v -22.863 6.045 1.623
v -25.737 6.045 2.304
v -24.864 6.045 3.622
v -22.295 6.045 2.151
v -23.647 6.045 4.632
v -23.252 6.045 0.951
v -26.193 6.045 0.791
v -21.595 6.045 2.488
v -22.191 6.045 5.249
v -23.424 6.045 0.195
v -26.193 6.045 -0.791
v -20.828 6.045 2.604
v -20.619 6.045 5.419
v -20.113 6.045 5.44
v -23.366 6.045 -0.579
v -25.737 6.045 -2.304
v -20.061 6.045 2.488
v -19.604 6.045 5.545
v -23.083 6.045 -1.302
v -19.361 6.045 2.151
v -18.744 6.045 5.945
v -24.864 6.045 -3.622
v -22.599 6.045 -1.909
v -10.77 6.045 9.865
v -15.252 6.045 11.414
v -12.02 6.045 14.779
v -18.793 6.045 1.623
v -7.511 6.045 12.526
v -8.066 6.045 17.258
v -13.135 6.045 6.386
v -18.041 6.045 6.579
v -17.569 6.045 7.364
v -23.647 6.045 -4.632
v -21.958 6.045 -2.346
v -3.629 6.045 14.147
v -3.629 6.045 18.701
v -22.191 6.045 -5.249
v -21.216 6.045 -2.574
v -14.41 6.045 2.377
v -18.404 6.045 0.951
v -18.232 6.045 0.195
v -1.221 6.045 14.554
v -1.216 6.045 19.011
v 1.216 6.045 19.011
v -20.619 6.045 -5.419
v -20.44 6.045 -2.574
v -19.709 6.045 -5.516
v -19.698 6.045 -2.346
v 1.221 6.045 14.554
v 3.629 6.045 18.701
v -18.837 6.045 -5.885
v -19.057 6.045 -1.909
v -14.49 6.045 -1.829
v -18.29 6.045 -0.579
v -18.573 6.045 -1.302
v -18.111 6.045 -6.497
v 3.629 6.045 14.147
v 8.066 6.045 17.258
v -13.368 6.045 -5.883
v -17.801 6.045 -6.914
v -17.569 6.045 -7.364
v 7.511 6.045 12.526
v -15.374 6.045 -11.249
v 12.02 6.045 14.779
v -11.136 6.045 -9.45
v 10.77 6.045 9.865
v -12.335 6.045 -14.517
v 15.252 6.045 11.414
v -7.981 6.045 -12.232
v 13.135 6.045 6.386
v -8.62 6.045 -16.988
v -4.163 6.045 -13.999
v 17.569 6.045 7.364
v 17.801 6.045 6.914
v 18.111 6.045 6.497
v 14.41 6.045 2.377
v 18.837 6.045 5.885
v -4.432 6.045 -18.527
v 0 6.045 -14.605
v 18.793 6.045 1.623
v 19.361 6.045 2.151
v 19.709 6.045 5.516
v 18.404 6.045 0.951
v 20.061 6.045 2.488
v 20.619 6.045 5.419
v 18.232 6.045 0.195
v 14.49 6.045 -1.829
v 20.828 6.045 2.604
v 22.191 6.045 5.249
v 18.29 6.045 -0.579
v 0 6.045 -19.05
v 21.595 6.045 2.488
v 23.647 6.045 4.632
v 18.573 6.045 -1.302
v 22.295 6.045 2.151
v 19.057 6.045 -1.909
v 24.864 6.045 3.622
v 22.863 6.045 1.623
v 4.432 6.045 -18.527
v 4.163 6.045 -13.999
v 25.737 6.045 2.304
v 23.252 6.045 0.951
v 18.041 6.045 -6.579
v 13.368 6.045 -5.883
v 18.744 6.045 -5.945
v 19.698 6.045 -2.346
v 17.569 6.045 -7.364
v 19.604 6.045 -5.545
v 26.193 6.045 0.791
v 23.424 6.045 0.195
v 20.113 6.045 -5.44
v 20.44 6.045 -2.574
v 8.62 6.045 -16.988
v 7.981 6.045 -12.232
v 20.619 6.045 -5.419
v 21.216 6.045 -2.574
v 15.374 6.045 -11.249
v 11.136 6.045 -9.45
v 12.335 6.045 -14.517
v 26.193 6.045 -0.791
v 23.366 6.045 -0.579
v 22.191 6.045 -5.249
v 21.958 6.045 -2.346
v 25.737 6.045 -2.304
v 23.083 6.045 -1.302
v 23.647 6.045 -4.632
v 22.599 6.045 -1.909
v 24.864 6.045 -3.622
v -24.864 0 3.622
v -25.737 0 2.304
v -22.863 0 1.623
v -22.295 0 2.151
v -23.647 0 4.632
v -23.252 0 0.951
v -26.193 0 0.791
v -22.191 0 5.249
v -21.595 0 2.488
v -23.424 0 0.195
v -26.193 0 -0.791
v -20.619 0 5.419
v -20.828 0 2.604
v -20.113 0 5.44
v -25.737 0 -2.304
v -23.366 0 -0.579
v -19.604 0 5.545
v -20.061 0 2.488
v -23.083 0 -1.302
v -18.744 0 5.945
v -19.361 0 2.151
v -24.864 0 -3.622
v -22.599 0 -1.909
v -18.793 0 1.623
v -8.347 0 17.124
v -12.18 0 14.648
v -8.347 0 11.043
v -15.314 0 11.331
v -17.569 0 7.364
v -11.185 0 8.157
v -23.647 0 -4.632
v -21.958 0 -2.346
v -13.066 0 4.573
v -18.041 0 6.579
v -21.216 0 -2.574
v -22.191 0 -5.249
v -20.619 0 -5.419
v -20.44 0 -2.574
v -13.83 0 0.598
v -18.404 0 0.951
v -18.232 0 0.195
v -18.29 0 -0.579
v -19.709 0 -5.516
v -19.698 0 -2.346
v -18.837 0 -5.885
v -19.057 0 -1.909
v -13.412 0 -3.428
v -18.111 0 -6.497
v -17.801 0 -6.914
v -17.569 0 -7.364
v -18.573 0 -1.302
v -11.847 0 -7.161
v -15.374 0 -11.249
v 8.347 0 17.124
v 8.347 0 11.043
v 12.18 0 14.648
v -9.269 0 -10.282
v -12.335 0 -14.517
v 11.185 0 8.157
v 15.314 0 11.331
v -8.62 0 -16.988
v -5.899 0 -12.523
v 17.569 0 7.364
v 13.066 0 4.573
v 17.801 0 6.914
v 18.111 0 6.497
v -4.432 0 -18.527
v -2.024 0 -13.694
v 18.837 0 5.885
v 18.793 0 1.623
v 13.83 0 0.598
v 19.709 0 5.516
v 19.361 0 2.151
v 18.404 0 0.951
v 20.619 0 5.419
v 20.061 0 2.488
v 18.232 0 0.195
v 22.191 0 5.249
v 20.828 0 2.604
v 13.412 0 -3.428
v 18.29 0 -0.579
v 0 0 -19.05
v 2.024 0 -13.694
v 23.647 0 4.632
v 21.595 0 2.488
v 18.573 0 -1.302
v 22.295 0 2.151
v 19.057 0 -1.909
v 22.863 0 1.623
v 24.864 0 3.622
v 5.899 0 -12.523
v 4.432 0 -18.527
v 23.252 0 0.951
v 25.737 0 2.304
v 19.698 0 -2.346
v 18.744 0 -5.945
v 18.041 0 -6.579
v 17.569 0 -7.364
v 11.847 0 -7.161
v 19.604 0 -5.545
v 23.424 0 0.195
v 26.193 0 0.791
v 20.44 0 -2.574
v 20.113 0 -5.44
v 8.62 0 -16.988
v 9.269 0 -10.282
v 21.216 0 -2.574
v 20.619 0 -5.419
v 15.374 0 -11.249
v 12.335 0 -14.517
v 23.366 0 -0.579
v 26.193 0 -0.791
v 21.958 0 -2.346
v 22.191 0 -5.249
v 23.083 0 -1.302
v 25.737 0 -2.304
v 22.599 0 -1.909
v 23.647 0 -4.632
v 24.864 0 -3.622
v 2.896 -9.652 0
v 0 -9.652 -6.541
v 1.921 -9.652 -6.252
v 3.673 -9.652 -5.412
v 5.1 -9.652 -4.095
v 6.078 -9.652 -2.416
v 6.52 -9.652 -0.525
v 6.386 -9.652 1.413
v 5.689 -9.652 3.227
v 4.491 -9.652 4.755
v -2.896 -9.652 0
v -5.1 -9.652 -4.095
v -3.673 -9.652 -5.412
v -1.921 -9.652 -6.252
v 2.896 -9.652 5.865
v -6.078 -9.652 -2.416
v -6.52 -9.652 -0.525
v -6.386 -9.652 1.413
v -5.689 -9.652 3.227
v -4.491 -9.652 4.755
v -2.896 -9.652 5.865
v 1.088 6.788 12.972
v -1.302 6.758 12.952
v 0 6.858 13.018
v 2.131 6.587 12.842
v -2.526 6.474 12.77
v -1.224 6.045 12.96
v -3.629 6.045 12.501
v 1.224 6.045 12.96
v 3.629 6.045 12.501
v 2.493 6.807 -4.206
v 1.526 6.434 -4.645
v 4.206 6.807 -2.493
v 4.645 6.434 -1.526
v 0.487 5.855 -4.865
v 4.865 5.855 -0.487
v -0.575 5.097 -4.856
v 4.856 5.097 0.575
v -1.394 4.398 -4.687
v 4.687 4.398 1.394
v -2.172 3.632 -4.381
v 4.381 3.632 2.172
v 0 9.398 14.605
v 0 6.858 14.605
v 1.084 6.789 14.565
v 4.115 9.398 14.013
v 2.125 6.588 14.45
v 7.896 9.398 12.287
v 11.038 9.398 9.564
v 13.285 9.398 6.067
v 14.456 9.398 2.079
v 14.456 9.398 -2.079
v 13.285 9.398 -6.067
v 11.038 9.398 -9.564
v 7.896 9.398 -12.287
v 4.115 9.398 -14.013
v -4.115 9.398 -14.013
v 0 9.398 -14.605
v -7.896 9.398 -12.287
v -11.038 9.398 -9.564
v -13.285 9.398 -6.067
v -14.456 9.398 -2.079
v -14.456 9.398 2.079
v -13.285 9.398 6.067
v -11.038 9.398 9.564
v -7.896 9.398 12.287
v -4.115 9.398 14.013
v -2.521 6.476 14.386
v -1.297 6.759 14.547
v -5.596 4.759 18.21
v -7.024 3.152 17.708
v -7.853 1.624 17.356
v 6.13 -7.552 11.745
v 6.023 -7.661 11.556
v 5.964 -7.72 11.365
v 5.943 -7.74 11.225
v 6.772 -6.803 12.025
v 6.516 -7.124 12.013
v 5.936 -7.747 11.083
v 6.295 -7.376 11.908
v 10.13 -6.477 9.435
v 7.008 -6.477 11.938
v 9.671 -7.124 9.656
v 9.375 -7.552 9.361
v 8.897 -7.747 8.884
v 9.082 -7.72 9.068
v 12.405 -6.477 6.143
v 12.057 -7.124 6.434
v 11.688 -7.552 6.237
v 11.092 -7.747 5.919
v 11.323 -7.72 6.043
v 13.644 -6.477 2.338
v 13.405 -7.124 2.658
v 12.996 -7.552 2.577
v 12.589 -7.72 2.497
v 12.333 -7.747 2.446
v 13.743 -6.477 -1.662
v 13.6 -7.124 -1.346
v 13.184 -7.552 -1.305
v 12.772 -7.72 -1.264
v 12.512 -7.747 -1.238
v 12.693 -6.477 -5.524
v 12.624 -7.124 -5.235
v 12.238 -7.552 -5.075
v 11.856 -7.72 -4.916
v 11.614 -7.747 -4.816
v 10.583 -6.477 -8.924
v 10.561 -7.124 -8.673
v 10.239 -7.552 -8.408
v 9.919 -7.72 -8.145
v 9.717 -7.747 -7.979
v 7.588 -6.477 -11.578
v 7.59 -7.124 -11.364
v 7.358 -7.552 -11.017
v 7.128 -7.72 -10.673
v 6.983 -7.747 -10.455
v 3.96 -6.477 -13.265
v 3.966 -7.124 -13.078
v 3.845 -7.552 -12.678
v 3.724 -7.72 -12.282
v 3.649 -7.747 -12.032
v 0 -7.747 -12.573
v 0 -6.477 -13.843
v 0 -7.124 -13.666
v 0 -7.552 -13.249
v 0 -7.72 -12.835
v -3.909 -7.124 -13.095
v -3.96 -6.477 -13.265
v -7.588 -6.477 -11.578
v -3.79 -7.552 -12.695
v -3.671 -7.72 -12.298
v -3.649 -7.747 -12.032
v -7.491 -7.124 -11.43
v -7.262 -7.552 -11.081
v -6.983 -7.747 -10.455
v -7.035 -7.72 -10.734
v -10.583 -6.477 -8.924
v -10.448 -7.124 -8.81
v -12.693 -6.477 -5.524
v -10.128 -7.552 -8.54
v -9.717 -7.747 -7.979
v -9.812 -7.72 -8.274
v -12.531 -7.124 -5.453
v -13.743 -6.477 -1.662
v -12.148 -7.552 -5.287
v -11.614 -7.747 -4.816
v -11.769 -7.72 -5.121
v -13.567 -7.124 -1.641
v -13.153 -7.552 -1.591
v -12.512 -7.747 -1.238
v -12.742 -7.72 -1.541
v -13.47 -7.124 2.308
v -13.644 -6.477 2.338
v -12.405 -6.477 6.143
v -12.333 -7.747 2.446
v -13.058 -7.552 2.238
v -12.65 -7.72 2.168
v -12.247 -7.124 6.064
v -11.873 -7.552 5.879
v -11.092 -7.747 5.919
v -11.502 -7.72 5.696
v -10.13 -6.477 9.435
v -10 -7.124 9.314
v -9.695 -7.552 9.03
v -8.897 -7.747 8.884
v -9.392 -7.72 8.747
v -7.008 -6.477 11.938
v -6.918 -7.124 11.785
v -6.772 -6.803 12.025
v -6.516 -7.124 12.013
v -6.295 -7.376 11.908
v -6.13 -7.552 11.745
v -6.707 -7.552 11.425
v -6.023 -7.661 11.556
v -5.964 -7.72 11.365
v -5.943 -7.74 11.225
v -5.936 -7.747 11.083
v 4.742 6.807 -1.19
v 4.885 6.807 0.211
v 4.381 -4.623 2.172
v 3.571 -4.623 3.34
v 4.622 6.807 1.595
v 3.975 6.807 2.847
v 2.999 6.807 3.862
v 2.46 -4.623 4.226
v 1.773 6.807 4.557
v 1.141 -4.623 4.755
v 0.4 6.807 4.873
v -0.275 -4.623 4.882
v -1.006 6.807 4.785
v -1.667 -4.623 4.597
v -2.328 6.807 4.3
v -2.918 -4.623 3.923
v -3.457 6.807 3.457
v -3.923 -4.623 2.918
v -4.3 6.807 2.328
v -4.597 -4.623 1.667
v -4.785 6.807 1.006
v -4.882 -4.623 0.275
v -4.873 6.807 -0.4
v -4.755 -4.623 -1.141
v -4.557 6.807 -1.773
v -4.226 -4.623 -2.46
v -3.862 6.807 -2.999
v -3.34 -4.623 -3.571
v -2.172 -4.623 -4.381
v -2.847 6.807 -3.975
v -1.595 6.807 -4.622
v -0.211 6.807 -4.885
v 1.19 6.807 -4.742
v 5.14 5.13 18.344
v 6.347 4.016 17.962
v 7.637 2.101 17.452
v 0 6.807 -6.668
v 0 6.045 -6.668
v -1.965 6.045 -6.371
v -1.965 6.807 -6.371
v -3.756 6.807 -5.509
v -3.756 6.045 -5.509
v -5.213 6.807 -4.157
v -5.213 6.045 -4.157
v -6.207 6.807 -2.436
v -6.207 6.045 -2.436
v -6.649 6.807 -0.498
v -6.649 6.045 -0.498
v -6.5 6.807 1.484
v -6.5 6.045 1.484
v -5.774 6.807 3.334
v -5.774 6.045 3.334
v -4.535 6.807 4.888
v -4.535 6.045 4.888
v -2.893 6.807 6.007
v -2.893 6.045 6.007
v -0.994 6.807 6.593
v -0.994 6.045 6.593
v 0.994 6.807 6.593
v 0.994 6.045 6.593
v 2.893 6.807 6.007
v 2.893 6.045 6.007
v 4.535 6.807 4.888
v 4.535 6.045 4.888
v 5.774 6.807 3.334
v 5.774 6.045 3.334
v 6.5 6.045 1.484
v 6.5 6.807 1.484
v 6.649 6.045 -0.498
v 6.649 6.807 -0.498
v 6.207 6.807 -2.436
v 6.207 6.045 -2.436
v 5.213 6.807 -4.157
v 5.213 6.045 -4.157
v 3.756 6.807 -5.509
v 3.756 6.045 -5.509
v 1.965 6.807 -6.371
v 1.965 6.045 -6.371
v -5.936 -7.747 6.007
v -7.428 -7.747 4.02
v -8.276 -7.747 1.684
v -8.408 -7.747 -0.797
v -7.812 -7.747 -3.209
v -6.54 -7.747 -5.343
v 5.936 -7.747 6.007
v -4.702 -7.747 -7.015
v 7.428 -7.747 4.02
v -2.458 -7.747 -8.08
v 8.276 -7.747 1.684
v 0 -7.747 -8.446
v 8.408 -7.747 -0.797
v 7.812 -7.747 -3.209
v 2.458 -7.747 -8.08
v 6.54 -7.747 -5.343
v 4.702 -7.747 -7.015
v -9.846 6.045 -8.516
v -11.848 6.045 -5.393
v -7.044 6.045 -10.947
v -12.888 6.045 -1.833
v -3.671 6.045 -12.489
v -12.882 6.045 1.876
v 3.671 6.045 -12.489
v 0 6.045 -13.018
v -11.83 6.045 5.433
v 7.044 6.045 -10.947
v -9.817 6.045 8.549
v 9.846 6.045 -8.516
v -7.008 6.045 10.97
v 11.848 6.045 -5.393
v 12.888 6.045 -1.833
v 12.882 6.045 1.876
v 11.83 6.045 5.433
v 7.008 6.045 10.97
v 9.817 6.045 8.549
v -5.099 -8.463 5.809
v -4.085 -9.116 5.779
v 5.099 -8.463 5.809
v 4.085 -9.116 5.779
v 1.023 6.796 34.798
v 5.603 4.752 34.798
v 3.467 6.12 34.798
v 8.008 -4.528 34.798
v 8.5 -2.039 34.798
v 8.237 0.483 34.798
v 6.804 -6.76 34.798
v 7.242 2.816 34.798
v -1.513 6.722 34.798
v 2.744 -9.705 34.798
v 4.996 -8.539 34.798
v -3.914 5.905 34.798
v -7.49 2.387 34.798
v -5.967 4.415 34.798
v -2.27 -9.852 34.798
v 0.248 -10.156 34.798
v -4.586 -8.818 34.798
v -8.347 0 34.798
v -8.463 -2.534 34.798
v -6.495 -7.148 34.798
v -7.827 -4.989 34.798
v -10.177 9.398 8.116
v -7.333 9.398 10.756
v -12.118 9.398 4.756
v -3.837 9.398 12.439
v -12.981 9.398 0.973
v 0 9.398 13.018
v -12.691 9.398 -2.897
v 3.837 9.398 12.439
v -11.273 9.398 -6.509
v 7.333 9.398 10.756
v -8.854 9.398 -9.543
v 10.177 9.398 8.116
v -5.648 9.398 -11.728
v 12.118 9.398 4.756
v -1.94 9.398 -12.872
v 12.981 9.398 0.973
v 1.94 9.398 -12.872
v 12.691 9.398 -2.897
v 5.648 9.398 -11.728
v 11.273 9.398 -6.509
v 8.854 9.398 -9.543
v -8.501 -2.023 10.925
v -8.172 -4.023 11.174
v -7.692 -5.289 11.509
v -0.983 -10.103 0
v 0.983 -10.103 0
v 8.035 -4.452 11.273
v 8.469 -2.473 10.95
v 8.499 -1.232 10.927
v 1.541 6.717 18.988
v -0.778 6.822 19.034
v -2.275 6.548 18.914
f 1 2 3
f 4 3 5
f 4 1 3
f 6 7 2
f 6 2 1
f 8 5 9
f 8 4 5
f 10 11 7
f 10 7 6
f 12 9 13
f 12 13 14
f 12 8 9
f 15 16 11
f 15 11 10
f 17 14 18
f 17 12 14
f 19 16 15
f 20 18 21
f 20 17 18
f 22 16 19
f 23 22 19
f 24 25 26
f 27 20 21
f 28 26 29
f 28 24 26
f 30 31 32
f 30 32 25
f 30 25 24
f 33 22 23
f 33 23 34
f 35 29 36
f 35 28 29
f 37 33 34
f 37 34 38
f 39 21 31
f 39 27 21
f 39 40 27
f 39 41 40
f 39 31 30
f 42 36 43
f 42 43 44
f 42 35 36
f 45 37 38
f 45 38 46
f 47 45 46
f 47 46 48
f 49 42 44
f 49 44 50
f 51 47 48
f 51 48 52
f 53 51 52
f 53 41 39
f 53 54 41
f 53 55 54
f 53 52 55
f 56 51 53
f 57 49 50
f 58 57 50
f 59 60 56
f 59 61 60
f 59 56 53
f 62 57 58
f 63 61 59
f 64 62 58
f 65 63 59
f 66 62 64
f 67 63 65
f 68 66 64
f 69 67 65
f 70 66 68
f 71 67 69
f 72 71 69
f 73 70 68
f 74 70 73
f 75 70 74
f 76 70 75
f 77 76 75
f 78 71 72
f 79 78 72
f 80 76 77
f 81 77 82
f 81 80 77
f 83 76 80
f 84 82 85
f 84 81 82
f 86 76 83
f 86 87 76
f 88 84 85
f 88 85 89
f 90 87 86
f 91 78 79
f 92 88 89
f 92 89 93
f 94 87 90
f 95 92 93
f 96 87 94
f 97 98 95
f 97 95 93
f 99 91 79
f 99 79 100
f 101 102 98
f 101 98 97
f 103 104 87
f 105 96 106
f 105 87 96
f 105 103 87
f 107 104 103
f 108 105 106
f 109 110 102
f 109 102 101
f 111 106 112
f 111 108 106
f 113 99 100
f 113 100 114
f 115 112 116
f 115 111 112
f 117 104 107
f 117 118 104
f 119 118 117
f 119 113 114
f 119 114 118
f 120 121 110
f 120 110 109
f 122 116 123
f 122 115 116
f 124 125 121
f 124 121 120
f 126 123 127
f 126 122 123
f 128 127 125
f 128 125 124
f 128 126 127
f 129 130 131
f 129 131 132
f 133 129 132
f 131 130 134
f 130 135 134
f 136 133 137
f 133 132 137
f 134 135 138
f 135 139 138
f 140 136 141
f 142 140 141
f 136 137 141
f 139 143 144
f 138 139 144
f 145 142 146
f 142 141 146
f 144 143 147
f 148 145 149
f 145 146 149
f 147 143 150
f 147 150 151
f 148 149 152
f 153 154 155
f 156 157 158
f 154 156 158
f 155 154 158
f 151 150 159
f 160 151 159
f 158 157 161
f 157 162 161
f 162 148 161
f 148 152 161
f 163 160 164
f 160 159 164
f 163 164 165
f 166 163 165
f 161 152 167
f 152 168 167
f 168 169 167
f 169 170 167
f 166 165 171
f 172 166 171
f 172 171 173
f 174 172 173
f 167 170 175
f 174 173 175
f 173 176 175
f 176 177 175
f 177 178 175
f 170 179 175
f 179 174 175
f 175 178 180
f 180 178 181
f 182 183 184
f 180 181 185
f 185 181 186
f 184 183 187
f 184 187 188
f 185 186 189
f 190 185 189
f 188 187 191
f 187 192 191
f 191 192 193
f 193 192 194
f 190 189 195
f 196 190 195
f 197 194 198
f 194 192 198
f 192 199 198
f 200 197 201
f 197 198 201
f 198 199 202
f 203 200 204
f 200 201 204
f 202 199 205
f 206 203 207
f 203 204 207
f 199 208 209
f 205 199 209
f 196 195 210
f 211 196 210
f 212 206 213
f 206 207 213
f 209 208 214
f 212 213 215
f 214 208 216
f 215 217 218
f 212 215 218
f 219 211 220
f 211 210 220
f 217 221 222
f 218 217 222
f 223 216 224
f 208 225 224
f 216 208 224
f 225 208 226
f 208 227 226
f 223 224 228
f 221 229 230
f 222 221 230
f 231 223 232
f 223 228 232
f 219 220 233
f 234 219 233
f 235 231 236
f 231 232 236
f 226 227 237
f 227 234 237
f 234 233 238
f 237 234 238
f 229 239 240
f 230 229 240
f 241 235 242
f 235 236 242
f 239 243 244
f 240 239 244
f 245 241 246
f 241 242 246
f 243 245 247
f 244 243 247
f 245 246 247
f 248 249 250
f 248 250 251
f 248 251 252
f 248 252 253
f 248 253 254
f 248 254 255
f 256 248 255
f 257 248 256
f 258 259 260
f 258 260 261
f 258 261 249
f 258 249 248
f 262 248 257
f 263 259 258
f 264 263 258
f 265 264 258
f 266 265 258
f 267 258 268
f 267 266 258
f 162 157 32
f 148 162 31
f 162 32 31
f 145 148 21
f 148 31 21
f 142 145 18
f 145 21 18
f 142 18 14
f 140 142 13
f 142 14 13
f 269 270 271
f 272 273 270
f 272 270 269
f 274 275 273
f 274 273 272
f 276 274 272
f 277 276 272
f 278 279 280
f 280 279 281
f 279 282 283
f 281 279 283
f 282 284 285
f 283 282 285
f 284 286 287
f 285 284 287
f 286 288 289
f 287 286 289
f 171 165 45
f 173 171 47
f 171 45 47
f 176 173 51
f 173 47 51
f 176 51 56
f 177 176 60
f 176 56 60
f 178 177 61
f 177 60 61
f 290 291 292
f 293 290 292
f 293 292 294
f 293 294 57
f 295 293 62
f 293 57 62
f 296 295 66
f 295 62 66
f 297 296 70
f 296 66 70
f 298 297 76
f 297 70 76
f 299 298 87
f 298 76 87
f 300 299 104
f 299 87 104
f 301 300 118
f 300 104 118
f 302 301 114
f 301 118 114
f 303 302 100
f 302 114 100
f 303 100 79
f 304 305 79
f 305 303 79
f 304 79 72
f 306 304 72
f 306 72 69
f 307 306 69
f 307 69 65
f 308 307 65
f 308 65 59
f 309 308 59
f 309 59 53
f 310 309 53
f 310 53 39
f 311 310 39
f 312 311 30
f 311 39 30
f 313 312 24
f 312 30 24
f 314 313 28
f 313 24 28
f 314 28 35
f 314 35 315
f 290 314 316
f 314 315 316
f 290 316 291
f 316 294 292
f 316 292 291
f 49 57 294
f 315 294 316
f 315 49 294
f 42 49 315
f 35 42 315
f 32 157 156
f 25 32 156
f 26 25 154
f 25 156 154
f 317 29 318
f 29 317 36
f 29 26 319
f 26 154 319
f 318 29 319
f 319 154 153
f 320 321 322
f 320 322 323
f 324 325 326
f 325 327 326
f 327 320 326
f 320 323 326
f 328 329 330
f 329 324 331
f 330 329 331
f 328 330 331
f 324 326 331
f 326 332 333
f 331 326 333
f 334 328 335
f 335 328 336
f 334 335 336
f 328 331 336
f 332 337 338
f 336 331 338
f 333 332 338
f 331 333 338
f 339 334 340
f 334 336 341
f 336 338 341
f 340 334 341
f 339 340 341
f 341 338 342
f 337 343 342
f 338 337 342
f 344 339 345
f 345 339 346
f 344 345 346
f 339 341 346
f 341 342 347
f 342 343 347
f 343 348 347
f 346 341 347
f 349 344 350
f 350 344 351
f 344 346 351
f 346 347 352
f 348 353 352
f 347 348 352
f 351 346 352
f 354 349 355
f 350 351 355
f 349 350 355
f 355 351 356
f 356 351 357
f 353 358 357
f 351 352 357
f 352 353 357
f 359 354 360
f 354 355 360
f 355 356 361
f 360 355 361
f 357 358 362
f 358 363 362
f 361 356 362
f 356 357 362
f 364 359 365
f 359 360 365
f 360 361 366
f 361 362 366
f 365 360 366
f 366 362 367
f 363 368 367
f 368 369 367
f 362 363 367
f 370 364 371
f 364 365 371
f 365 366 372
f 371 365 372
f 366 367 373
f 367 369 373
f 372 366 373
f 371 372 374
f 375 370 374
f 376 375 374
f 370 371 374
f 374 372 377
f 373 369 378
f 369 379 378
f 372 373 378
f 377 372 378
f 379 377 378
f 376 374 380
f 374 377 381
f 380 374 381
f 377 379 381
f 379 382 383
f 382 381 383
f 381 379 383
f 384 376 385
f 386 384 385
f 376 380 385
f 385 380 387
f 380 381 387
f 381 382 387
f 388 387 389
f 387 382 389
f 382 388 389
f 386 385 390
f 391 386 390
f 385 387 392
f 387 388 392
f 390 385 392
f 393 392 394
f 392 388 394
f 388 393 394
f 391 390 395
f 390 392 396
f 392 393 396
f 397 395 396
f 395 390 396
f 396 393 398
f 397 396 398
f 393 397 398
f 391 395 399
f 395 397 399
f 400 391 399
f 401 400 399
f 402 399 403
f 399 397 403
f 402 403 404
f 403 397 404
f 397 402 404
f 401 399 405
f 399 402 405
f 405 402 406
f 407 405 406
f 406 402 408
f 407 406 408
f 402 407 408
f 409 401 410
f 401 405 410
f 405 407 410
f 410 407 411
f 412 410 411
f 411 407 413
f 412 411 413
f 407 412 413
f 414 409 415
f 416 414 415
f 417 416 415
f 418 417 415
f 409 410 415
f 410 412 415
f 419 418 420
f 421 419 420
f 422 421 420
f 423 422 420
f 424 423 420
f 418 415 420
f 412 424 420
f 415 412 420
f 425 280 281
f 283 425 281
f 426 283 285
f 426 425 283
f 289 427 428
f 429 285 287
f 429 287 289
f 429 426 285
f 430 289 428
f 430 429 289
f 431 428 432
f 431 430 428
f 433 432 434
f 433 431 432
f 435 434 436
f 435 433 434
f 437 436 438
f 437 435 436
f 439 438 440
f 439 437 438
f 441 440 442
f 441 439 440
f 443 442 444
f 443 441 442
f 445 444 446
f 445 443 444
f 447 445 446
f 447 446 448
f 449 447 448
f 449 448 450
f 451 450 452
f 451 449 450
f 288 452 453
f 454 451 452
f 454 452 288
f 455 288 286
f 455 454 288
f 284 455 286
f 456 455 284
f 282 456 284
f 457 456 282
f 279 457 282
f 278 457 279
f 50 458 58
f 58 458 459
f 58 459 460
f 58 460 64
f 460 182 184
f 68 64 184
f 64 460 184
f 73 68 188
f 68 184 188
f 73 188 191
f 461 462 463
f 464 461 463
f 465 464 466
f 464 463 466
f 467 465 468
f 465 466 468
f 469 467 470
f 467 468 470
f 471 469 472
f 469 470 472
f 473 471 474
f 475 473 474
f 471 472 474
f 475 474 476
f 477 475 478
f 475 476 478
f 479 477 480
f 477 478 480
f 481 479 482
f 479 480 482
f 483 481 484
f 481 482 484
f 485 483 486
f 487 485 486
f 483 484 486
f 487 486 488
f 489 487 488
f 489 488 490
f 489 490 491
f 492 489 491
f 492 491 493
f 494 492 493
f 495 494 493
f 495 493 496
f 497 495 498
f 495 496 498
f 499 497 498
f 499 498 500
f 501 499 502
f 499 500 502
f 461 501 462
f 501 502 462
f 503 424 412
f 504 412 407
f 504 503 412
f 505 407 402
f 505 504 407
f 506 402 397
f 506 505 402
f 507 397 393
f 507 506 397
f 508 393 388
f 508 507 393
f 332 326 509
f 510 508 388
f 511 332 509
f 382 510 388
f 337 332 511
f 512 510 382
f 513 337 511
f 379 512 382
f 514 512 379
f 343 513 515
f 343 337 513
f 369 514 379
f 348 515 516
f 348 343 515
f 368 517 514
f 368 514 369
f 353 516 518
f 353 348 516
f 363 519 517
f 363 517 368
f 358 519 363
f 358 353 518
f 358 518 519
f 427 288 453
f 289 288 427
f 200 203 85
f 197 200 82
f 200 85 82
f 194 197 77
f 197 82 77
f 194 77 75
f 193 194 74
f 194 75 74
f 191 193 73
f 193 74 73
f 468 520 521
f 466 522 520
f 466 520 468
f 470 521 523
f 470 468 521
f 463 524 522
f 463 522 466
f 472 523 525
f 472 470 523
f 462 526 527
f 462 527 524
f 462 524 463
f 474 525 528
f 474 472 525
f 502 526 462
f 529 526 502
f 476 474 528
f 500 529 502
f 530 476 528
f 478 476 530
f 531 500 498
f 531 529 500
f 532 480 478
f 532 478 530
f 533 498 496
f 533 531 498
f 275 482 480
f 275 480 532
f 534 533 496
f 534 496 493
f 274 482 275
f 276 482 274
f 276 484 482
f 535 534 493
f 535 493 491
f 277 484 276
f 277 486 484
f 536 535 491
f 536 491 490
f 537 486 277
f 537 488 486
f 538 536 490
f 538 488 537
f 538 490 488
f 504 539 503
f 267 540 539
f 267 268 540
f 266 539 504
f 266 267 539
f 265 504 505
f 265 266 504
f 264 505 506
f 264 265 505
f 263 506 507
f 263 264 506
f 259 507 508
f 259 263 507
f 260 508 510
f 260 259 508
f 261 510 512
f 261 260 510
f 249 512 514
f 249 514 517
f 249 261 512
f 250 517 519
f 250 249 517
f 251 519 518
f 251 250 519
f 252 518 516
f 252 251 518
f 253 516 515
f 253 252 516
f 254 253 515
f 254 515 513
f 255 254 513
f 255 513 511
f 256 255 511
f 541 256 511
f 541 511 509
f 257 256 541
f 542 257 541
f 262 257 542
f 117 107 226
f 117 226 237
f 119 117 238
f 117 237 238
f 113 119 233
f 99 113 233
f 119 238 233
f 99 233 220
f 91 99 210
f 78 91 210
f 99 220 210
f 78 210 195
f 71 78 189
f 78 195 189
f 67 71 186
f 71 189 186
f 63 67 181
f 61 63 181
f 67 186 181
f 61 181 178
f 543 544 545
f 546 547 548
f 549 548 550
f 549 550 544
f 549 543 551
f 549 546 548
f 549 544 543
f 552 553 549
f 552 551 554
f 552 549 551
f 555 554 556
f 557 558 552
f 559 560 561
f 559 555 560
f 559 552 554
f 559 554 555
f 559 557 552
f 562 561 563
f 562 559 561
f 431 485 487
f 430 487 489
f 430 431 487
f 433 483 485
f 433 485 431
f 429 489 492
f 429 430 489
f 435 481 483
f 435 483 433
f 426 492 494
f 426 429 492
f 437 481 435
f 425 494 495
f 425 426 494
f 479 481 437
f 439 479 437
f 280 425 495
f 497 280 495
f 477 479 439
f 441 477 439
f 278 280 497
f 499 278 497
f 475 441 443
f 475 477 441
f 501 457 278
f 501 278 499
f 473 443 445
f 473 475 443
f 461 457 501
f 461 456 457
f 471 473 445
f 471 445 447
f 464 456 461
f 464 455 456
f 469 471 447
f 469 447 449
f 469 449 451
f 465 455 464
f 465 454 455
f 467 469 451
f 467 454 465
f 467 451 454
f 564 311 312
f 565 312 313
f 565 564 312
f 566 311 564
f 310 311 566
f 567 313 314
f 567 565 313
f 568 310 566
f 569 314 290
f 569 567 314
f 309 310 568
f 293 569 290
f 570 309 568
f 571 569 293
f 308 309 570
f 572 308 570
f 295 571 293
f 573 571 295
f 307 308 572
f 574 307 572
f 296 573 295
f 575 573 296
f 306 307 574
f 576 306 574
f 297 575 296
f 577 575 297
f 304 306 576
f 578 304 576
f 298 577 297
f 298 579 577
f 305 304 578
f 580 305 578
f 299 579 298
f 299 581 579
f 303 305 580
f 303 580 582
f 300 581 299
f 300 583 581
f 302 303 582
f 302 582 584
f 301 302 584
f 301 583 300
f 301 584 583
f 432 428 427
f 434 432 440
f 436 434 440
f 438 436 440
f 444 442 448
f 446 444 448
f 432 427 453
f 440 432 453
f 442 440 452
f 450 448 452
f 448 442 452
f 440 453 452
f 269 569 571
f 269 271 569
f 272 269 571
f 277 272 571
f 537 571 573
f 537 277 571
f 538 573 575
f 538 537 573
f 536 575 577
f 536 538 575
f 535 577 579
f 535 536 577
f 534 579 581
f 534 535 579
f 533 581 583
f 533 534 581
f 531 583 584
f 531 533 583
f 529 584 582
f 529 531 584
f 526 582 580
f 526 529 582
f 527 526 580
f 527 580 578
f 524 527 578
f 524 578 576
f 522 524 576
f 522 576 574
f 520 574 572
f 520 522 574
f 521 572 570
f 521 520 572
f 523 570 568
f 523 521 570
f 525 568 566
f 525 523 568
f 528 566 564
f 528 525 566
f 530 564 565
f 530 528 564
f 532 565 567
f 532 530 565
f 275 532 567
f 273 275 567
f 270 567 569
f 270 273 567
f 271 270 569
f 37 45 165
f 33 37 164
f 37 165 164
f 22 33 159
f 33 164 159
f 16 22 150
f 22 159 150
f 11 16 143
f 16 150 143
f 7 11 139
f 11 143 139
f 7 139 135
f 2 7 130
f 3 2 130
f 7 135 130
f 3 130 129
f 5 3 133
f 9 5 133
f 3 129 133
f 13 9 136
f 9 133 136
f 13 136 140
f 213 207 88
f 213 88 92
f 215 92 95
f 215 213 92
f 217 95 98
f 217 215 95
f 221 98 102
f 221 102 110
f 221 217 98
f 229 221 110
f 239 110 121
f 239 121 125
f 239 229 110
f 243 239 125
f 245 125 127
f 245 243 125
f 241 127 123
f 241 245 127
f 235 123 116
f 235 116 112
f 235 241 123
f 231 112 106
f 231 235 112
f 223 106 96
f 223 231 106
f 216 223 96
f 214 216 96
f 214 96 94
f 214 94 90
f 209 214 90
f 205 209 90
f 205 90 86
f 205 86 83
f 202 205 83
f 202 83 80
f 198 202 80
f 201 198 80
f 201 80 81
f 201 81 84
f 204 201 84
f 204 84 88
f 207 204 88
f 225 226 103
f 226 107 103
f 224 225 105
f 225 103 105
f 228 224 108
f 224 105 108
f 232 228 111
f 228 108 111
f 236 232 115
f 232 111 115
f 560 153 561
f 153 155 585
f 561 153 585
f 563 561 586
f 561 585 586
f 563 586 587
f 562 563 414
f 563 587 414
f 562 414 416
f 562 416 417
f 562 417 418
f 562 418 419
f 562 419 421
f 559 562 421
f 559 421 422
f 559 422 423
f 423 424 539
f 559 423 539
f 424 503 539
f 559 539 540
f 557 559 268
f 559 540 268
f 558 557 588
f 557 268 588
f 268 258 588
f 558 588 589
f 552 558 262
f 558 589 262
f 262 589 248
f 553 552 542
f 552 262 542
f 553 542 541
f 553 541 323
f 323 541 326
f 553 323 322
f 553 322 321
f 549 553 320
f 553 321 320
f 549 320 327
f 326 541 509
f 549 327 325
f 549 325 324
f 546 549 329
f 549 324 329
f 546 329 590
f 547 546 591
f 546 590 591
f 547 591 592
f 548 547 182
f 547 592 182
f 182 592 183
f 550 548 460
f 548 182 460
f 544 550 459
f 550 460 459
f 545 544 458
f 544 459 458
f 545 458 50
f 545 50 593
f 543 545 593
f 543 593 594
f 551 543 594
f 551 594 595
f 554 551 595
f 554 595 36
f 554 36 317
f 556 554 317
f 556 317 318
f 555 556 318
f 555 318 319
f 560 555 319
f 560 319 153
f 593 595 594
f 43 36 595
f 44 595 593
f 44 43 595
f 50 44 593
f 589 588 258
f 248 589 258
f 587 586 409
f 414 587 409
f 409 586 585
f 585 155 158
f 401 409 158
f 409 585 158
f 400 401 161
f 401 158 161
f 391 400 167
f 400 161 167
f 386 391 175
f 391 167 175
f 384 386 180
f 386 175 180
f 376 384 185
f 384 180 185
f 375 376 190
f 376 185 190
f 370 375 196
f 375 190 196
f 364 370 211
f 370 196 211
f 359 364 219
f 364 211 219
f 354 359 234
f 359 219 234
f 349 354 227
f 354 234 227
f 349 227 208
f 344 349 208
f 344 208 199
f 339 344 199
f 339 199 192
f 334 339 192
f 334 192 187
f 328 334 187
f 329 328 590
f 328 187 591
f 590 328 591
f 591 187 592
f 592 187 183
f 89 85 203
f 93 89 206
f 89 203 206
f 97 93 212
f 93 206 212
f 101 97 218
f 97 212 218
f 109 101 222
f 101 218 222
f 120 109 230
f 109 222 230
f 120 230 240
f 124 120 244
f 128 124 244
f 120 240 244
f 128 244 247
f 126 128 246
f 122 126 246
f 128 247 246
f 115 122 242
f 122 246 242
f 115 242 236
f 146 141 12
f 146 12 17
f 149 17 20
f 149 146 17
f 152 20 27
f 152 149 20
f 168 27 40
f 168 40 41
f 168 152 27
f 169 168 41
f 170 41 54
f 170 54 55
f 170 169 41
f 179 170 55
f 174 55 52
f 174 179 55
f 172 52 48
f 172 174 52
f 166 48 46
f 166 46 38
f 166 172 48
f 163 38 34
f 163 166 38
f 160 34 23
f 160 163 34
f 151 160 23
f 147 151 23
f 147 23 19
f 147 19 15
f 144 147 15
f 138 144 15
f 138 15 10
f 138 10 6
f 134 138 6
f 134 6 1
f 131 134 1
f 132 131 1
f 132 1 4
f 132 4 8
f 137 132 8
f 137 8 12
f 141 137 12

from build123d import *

# Parameters (mm, degrees)
SKETCH3_R           = 2.6035
BOSS_EXTRUDE1_DEPTH = 9.398
CUT_EXTRUDE1_START  = -3.3528
SKETCH4_R           = 14.605
SKETCH4_R_2         = 2.6035
SKETCH4_R_3         = 13.0175
CUT_EXTRUDE1_DEPTH  = 3.3528
SKETCH5_R           = 13.843
BOSS_EXTRUDE2_DEPTH = 7.747
SKETCH6_R           = 8.4455
BOSS_EXTRUDE3_DEPTH = 1.905
SKETCH7_R           = 8.509
BOSS_EXTRUDE4_DEPTH = 34.798
CUT_EXTRUDE2_DEPTH  = 47.503968347
FILLET1_R           = 3.175
CHAMFER1_SIZE       = 1.905
SKETCH9_R           = 6.6675
BOSS_EXTRUDE5_DEPTH = 0.762
CUT_EXTRUDE3_DEPTH  = 11.43
CHAMFER2_SIZE       = 3.175
FILLET2_R           = 1.27


with BuildPart() as part:
    # Sketch3 → Boss-Extrude1 (new body)
    with BuildSketch(Plane(origin=(0, 0, 0), x_dir=(1, 0, 0), z_dir=(0, 1, 0))):
        with BuildLine():
            ThreePointArc((18.41992125, -4.85890946), (26.2509, 0), (18.41992125, 4.85890946))
            ThreePointArc((18.41992125, 4.85890946), (0, 19.05), (-18.41992125, 4.85890946))
            ThreePointArc((-18.41992125, 4.85890946), (-26.2509, 0), (-18.41992125, -4.85890946))
            ThreePointArc((-18.41992125, -4.85890946), (0, -19.05), (18.41992125, -4.85890946))
        make_face()
        with Locations(Location((-20.828, 0, 0), (0, 0, 270))):
            Circle(SKETCH3_R, mode=Mode.SUBTRACT)
        with Locations(Location((20.828, 0, 0), (0, 0, 270))):
            Circle(SKETCH3_R, mode=Mode.SUBTRACT)
    extrude(amount=BOSS_EXTRUDE1_DEPTH)

    # Sketch4 → Cut-Extrude1 (cut)
    # profile 1 of 2: a face of its own
    with BuildSketch(Plane(origin=(0, 9.398, 0), x_dir=(1, 0, 0), z_dir=(0, 1, 0)).offset(CUT_EXTRUDE1_START)):
        with BuildLine():
            ThreePointArc((-18.41992125, 4.85890946), (-26.2509, 0), (-18.41992125, -4.85890946))
            ThreePointArc((-18.41992125, -4.85890946), (0, -19.05), (18.41992125, -4.85890946))
            ThreePointArc((18.41992125, -4.85890946), (26.2509, 0), (18.41992125, 4.85890946))
            ThreePointArc((18.41992125, 4.85890946), (0, 19.05), (-18.41992125, 4.85890946))
        make_face()
        with Locations(Location((0, 0, 0), (0, 0, 270))):
            Circle(SKETCH4_R, mode=Mode.SUBTRACT)
        with Locations(Location((20.828, 0, 0), (0, 0, 270))):
            Circle(SKETCH4_R_2, mode=Mode.SUBTRACT)
        with Locations(Location((-20.828, 0, 0), (0, 0, 270))):
            Circle(SKETCH4_R_2, mode=Mode.SUBTRACT)
    # profile 2 of 2: a face of its own
    with BuildSketch(Plane(origin=(0, 9.398, 0), x_dir=(1, 0, 0), z_dir=(0, 1, 0)).offset(CUT_EXTRUDE1_START)):
        with Locations(Location((0, 0, 0), (0, 0, 270))):
            Circle(SKETCH4_R_3)
    extrude(amount=CUT_EXTRUDE1_DEPTH, mode=Mode.SUBTRACT)

    # Sketch5 → Boss-Extrude2 (add)
    with BuildSketch(Plane.XZ):
        with Locations(Location((0, 0, 0), (0, 0, 270))):
            Circle(SKETCH5_R)
    extrude(amount=BOSS_EXTRUDE2_DEPTH)

    # Sketch6 → Boss-Extrude3 (add)
    with BuildSketch(Plane.XZ.offset(7.747)):
        with Locations(Location((0, 0, 0), (0, 0, 90))):
            Circle(SKETCH6_R)
    extrude(amount=BOSS_EXTRUDE3_DEPTH)

    # Sketch7 → Boss-Extrude4 (add)
    with BuildSketch(Plane.XY):
        with Locations(Location((0, -1.651, 0), (0, 0, 168.811944249))):
            Circle(SKETCH7_R)
    extrude(amount=BOSS_EXTRUDE4_DEPTH)

    # Sketch8 → Cut-Extrude2 (cut, through all)
    with BuildSketch(Plane(origin=(0, 6.0452, 0), x_dir=(1, 0, 0), z_dir=(0, 1, 0))):
        with BuildLine():
            Line((-3.629268047, 0), (-3.629268047, -12.501348715))
            ThreePointArc((-3.629268047, -12.501348715), (0, -13.0175), (3.629268047, -12.501348715))
            Line((3.629268047, -12.501348715), (3.629268047, 0))
            Line((3.629268047, 0), (-3.629268047, 0))
        make_face()
        with BuildLine():
            ThreePointArc((-3.629268047, -18.70109391), (0, -19.05), (3.629268047, -18.70109391))
            Line((3.629268047, -18.70109391), (3.629268047, -14.146887942))
            ThreePointArc((3.629268047, -14.146887942), (0, -14.605), (-3.629268047, -14.146887942))
            Line((-3.629268047, -14.146887942), (-3.629268047, -18.70109391))
        make_face()
    extrude(amount=CUT_EXTRUDE2_DEPTH, mode=Mode.SUBTRACT)

    # Fillet1
    fillet1_edges = [part.edges().sort_by_distance(p)[0] for p in [
        (-18.41992125, 3.0226, 4.85890946),
        (-18.41992125, 3.0226, -4.85890946),
        (18.41992125, 3.0226, -4.85890946),
        (18.41992125, 3.0226, 4.85890946),
    ]]
    fillet(fillet1_edges, radius=FILLET1_R)

    # Chamfer1
    chamfer1_edges = [part.edges().sort_by_distance(p)[0] for p in [
        (0, -9.652, -8.4455),
    ]]
    chamfer(chamfer1_edges, length=CHAMFER1_SIZE - 0.0001)  # a hair under: the kernel refuses the full size

    # Sketch9 → Boss-Extrude5 (add)
    with BuildSketch(Plane(origin=(0, 6.0452, 0), x_dir=(1, 0, 0), z_dir=(0, 1, 0))):
        with Locations(Location((0, 0, 0), (0, 0, 90))):
            Circle(SKETCH9_R)
    extrude(amount=BOSS_EXTRUDE5_DEPTH)

    # Sketch10 → Cut-Extrude3 (cut)
    with BuildSketch(Plane(origin=(0, 6.8072, 0), x_dir=(1, 0, 0), z_dir=(0, 1, 0))):
        with BuildLine():
            Line((-2.171634675, 4.380777681), (4.380777681, -2.171634675))
            ThreePointArc((4.380777681, -2.171634675), (-3.457398607, -3.457398607), (-2.171634675, 4.380777681))
        make_face()
    extrude(amount=-CUT_EXTRUDE3_DEPTH, mode=Mode.SUBTRACT)

    # Chamfer2
    chamfer2_edges = [part.edges().sort_by_distance(p)[0] for p in [
        (1.104571503, 6.8072, -1.104571503),
    ]]
    chamfer(chamfer2_edges, length=CHAMFER2_SIZE)

    # Fillet2
    fillet2_edges = [part.edges().sort_by_distance(p)[0] for p in [
        (0, -7.747, -13.843),
    ]]
    fillet(fillet2_edges, radius=FILLET2_R)


solid = part.part
